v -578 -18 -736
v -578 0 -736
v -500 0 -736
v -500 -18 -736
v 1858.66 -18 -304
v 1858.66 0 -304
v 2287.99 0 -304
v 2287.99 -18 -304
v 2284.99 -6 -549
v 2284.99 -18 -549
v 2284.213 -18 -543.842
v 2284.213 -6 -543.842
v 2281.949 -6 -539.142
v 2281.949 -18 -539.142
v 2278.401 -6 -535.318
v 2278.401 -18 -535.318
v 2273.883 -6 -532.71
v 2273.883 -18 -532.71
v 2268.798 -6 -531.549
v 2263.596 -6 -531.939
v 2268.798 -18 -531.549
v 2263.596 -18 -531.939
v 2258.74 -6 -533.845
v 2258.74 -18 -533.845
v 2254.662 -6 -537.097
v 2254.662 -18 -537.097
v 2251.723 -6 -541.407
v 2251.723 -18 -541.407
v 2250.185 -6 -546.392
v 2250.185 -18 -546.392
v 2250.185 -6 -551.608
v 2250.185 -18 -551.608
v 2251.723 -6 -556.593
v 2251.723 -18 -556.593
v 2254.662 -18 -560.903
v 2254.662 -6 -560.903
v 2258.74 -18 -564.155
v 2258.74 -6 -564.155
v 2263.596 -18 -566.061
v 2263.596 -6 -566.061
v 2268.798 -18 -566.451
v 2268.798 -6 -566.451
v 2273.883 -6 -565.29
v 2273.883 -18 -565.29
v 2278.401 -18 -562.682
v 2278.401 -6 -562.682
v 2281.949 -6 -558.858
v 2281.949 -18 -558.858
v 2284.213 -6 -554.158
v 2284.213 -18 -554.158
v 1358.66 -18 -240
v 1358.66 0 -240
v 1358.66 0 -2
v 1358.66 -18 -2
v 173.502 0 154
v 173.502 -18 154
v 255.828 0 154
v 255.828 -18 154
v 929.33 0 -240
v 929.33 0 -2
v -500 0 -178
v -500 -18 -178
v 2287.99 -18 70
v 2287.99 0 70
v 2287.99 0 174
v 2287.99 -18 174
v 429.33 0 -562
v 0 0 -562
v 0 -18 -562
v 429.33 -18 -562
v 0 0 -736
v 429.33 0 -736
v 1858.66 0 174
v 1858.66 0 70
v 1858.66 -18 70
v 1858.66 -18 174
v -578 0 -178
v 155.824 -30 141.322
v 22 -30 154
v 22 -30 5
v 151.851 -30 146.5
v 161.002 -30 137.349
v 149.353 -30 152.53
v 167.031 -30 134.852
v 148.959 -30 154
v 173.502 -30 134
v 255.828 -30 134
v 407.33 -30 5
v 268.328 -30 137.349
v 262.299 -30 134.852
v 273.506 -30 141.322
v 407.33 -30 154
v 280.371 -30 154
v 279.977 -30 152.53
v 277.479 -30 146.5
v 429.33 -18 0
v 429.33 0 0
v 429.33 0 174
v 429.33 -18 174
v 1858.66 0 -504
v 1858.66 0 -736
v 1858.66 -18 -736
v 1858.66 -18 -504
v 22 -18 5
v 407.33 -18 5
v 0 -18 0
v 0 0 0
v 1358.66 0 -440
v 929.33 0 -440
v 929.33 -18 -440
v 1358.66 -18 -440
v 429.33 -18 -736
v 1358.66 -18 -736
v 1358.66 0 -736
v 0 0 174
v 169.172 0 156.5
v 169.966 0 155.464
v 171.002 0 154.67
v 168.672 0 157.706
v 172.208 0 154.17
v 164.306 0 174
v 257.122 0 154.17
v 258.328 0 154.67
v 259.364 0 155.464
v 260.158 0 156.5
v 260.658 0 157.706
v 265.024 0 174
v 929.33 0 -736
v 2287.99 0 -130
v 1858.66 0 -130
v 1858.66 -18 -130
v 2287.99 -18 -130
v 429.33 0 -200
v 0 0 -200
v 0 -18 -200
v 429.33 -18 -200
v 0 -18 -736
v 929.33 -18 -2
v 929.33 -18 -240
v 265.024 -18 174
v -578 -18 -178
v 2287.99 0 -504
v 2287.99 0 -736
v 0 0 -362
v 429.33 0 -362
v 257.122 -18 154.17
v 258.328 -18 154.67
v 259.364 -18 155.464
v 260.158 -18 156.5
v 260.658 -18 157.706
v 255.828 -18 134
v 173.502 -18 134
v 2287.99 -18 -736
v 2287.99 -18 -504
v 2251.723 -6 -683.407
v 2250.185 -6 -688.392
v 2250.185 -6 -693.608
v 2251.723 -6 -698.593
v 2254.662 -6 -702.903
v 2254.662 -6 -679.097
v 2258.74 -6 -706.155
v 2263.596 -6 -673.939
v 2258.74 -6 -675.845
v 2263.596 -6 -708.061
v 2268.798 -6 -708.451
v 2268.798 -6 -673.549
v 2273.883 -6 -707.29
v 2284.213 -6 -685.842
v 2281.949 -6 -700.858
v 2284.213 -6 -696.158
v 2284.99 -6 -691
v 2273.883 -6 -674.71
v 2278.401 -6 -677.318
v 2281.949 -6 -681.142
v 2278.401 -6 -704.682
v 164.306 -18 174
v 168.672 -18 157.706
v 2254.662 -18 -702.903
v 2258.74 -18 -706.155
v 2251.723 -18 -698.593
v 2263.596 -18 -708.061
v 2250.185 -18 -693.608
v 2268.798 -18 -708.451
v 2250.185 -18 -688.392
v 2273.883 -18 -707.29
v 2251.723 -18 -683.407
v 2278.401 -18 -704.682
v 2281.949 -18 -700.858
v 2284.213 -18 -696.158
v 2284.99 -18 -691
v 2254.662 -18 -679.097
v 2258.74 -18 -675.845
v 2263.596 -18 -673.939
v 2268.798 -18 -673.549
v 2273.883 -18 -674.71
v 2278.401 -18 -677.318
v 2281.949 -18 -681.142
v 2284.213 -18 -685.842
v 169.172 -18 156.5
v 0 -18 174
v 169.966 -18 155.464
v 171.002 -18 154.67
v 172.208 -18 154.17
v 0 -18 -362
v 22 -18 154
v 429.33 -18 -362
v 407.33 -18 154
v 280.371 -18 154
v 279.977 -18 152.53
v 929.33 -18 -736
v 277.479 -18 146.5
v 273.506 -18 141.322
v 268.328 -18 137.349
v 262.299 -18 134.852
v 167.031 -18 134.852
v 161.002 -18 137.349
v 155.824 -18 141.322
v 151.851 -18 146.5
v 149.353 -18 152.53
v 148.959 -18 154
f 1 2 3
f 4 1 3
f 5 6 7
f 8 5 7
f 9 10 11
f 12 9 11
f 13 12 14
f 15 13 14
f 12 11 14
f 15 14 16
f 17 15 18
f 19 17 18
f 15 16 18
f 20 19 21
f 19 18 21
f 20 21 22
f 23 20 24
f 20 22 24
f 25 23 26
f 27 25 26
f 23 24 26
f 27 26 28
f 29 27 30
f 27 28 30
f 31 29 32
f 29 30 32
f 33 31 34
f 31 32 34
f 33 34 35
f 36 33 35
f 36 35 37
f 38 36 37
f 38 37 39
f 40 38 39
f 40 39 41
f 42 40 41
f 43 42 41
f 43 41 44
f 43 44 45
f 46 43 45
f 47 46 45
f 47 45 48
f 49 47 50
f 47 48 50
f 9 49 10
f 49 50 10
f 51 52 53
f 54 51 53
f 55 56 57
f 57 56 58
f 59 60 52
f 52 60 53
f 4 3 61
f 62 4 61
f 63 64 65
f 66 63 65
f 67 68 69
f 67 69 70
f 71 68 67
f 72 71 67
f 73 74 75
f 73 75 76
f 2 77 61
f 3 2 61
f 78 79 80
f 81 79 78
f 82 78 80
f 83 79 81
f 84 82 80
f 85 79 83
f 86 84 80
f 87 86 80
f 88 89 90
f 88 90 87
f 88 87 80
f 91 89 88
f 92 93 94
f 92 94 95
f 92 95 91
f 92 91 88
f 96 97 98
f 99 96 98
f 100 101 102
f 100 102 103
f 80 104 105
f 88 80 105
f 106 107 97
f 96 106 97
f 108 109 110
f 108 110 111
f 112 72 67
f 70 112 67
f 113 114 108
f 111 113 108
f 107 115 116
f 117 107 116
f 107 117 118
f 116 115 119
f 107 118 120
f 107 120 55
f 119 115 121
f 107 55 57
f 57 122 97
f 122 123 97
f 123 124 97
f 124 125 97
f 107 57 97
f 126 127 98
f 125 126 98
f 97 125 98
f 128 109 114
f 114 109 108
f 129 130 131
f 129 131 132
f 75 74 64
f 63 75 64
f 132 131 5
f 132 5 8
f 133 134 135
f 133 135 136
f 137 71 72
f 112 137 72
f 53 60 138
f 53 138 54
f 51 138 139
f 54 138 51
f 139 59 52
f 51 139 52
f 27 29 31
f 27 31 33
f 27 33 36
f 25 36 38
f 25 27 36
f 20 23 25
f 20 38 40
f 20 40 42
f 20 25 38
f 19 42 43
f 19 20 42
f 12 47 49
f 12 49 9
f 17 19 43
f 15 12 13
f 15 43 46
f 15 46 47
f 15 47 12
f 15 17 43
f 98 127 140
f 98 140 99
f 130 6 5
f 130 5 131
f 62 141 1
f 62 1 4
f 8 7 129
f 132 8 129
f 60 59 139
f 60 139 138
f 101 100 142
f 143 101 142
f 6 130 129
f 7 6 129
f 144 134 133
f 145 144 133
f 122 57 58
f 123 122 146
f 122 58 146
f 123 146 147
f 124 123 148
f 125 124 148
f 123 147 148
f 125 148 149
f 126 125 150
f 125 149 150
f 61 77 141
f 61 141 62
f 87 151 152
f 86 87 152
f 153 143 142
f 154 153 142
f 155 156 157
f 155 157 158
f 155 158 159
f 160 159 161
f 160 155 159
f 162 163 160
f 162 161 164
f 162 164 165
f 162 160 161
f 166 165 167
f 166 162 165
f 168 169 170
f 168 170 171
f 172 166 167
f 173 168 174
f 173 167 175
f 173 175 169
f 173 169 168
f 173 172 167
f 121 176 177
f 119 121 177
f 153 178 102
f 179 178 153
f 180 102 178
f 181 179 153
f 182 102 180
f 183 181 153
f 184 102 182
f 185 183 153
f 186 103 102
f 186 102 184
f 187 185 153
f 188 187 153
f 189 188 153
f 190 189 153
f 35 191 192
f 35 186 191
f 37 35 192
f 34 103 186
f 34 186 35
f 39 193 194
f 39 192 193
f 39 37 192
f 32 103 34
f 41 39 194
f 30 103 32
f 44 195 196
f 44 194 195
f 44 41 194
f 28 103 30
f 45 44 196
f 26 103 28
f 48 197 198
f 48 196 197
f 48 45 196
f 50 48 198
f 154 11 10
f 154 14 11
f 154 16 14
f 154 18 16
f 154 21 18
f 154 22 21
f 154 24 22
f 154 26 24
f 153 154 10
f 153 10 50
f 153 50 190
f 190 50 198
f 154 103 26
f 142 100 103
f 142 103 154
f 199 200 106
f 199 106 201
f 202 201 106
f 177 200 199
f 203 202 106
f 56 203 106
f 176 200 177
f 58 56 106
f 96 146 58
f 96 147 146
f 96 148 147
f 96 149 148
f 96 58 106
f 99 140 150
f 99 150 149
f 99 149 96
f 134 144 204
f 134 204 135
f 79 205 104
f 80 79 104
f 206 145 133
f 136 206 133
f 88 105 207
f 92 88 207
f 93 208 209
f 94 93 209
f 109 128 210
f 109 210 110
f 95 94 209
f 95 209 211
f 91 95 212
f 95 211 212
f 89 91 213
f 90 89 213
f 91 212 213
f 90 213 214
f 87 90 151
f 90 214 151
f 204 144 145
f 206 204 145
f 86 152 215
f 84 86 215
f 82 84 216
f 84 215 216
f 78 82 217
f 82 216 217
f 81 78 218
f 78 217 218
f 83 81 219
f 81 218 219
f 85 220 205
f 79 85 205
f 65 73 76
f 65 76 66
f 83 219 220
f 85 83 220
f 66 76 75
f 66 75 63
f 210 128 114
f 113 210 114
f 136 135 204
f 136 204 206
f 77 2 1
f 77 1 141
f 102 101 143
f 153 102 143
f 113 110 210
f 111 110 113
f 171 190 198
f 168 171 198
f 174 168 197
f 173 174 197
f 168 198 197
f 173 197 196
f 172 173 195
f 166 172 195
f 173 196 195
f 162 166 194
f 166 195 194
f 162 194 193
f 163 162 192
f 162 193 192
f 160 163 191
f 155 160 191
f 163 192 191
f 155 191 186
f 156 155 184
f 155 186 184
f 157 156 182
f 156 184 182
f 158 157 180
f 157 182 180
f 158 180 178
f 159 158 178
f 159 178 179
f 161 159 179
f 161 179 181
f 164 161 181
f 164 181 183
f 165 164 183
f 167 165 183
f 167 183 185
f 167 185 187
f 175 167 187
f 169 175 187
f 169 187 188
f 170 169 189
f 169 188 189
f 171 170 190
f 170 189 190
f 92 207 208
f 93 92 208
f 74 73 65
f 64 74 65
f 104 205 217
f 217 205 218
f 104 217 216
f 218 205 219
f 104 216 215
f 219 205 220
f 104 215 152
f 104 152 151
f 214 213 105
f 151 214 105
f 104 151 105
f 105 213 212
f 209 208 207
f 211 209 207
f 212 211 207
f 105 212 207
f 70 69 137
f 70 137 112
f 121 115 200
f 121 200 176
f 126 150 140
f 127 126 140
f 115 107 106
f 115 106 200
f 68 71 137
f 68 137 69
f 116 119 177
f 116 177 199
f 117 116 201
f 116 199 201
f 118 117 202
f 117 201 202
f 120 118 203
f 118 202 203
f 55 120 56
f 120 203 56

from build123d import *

# Parameters (mm, degrees)
F1_W     = 78
F1_H     = 558
F2_DEPTH = 18
F1_W_2   = 429.33
F1_H_2   = 174
F1_H_3   = 162
F1_H_4   = 238
F1_H_5   = 296
F1_H_6   = 104
F1_H_7   = 232
F3_R     = 17.5
F4_DEPTH = 12
F6_DEPTH = 18
F8_DEPTH = 12


# Not quite as in the source:
# - a feature names something its author has since deleted; it is built from what else it names


with BuildPart() as f2:
    # F1 (on Front) → F2 (new body)
    with BuildSketch(Plane.XZ):
        with Locations((-539, -457)):
            Rectangle(F1_W, F1_H)
    extrude(amount=F2_DEPTH)


with BuildPart() as f2b:
    # F1 (on Front) → F2, piece 2 (new body)
    with BuildSketch(Plane.XZ):
        with Locations((214.665, 87)):
            Rectangle(F1_W_2, F1_H_2)
    extrude(amount=F2_DEPTH)

    # F5 (on face) → F6 (cut)
    with BuildSketch(Plane.XZ.offset(18)):
        with BuildLine():
            ThreePointArc((168.6720058084, 157.7059047745), (170.4578277949, 155.0332332985), (173.5016349399, 154))
            Line((173.5016349399, 154), (214.665, 154))
            Line((214.665, 154), (255.8283650601, 154))
            ThreePointArc((255.8283650601, 154), (258.8721722051, 155.0332332985), (260.6579941916, 157.7059047745))
            Line((260.6579941916, 157.7059047745), (265.0239838486, 174))
            Line((265.0239838486, 174), (164.3060161514, 174))
            Line((164.3060161514, 174), (168.6720058084, 157.7059047745))
        make_face()
    extrude(amount=-F6_DEPTH, mode=Mode.SUBTRACT)


with BuildPart() as f2c:
    # F1 (on Front) → F2, piece 3 (new body)
    with BuildSketch(Plane.XZ):
        with Locations((214.665, -281)):
            Rectangle(F1_W_2, F1_H_3)
    extrude(amount=F2_DEPTH)


with BuildPart() as f2d:
    # F1 (on Front) → F2, piece 4 (new body)
    with BuildSketch(Plane.XZ):
        with Locations((214.665, -649)):
            Rectangle(F1_W_2, F1_H_2)
    extrude(amount=F2_DEPTH)


with BuildPart() as f2e:
    # F1 (on Front) → F2, piece 5 (new body)
    with BuildSketch(Plane.XZ):
        with Locations((1143.995, -121)):
            Rectangle(F1_W_2, F1_H_4)
    extrude(amount=F2_DEPTH)


with BuildPart() as f2f:
    # F1 (on Front) → F2, piece 6 (new body)
    with BuildSketch(Plane.XZ):
        with Locations((1143.995, -588)):
            Rectangle(F1_W_2, F1_H_5)
    extrude(amount=F2_DEPTH)


with BuildPart() as f2g:
    # F1 (on Front) → F2, piece 7 (new body)
    with BuildSketch(Plane.XZ):
        with Locations((2073.325, 122)):
            Rectangle(F1_W_2, F1_H_6)
    extrude(amount=F2_DEPTH)


with BuildPart() as f2h:
    # F1 (on Front) → F2, piece 8 (new body)
    with BuildSketch(Plane.XZ):
        with Locations((2073.325, -217)):
            Rectangle(F1_W_2, F1_H_2)
    extrude(amount=F2_DEPTH)


with BuildPart() as f2i:
    # F1 (on Front) → F2, piece 9 (new body)
    with BuildSketch(Plane.XZ):
        with Locations((2073.325, -620)):
            Rectangle(F1_W_2, F1_H_7)
    extrude(amount=F2_DEPTH)

    # F3 (on face) → F4 (cut)
    with BuildSketch(Plane.XZ.offset(18)):
        with Locations((2267.49, -549)):
            Circle(F3_R)
        with Locations((2267.49, -691)):
            Circle(F3_R)
    extrude(amount=-F4_DEPTH, mode=Mode.SUBTRACT)


with BuildPart() as f8:
    # F7 (on face) → F8 (new body)
    with BuildSketch(Plane.XZ.offset(18)):
        with BuildLine():
            Line((22, 154), (22, 5))
            Line((22, 5), (407.33, 5))
            Line((407.33, 5), (407.33, 154))
            Line((407.33, 154), (280.3705236082, 154))
            Line((280.3705236082, 154), (279.9765107173, 152.5295238724))
            ThreePointArc((279.9765107173, 152.5295238724), (271.0474007853, 139.1661664927), (255.8283650601, 134))
            Line((255.8283650601, 134), (173.5016349399, 134))
            ThreePointArc((173.5016349399, 134), (158.2825992147, 139.1661664927), (149.3534892827, 152.5295238724))
            Line((149.3534892827, 152.5295238724), (148.9594763918, 154))
            Line((148.9594763918, 154), (22, 154))
        make_face()
    extrude(amount=F8_DEPTH)


solid = Compound([f2.part, f2b.part, f2c.part, f2d.part, f2e.part, f2f.part, f2g.part, f2h.part, f2i.part, f8.part])
